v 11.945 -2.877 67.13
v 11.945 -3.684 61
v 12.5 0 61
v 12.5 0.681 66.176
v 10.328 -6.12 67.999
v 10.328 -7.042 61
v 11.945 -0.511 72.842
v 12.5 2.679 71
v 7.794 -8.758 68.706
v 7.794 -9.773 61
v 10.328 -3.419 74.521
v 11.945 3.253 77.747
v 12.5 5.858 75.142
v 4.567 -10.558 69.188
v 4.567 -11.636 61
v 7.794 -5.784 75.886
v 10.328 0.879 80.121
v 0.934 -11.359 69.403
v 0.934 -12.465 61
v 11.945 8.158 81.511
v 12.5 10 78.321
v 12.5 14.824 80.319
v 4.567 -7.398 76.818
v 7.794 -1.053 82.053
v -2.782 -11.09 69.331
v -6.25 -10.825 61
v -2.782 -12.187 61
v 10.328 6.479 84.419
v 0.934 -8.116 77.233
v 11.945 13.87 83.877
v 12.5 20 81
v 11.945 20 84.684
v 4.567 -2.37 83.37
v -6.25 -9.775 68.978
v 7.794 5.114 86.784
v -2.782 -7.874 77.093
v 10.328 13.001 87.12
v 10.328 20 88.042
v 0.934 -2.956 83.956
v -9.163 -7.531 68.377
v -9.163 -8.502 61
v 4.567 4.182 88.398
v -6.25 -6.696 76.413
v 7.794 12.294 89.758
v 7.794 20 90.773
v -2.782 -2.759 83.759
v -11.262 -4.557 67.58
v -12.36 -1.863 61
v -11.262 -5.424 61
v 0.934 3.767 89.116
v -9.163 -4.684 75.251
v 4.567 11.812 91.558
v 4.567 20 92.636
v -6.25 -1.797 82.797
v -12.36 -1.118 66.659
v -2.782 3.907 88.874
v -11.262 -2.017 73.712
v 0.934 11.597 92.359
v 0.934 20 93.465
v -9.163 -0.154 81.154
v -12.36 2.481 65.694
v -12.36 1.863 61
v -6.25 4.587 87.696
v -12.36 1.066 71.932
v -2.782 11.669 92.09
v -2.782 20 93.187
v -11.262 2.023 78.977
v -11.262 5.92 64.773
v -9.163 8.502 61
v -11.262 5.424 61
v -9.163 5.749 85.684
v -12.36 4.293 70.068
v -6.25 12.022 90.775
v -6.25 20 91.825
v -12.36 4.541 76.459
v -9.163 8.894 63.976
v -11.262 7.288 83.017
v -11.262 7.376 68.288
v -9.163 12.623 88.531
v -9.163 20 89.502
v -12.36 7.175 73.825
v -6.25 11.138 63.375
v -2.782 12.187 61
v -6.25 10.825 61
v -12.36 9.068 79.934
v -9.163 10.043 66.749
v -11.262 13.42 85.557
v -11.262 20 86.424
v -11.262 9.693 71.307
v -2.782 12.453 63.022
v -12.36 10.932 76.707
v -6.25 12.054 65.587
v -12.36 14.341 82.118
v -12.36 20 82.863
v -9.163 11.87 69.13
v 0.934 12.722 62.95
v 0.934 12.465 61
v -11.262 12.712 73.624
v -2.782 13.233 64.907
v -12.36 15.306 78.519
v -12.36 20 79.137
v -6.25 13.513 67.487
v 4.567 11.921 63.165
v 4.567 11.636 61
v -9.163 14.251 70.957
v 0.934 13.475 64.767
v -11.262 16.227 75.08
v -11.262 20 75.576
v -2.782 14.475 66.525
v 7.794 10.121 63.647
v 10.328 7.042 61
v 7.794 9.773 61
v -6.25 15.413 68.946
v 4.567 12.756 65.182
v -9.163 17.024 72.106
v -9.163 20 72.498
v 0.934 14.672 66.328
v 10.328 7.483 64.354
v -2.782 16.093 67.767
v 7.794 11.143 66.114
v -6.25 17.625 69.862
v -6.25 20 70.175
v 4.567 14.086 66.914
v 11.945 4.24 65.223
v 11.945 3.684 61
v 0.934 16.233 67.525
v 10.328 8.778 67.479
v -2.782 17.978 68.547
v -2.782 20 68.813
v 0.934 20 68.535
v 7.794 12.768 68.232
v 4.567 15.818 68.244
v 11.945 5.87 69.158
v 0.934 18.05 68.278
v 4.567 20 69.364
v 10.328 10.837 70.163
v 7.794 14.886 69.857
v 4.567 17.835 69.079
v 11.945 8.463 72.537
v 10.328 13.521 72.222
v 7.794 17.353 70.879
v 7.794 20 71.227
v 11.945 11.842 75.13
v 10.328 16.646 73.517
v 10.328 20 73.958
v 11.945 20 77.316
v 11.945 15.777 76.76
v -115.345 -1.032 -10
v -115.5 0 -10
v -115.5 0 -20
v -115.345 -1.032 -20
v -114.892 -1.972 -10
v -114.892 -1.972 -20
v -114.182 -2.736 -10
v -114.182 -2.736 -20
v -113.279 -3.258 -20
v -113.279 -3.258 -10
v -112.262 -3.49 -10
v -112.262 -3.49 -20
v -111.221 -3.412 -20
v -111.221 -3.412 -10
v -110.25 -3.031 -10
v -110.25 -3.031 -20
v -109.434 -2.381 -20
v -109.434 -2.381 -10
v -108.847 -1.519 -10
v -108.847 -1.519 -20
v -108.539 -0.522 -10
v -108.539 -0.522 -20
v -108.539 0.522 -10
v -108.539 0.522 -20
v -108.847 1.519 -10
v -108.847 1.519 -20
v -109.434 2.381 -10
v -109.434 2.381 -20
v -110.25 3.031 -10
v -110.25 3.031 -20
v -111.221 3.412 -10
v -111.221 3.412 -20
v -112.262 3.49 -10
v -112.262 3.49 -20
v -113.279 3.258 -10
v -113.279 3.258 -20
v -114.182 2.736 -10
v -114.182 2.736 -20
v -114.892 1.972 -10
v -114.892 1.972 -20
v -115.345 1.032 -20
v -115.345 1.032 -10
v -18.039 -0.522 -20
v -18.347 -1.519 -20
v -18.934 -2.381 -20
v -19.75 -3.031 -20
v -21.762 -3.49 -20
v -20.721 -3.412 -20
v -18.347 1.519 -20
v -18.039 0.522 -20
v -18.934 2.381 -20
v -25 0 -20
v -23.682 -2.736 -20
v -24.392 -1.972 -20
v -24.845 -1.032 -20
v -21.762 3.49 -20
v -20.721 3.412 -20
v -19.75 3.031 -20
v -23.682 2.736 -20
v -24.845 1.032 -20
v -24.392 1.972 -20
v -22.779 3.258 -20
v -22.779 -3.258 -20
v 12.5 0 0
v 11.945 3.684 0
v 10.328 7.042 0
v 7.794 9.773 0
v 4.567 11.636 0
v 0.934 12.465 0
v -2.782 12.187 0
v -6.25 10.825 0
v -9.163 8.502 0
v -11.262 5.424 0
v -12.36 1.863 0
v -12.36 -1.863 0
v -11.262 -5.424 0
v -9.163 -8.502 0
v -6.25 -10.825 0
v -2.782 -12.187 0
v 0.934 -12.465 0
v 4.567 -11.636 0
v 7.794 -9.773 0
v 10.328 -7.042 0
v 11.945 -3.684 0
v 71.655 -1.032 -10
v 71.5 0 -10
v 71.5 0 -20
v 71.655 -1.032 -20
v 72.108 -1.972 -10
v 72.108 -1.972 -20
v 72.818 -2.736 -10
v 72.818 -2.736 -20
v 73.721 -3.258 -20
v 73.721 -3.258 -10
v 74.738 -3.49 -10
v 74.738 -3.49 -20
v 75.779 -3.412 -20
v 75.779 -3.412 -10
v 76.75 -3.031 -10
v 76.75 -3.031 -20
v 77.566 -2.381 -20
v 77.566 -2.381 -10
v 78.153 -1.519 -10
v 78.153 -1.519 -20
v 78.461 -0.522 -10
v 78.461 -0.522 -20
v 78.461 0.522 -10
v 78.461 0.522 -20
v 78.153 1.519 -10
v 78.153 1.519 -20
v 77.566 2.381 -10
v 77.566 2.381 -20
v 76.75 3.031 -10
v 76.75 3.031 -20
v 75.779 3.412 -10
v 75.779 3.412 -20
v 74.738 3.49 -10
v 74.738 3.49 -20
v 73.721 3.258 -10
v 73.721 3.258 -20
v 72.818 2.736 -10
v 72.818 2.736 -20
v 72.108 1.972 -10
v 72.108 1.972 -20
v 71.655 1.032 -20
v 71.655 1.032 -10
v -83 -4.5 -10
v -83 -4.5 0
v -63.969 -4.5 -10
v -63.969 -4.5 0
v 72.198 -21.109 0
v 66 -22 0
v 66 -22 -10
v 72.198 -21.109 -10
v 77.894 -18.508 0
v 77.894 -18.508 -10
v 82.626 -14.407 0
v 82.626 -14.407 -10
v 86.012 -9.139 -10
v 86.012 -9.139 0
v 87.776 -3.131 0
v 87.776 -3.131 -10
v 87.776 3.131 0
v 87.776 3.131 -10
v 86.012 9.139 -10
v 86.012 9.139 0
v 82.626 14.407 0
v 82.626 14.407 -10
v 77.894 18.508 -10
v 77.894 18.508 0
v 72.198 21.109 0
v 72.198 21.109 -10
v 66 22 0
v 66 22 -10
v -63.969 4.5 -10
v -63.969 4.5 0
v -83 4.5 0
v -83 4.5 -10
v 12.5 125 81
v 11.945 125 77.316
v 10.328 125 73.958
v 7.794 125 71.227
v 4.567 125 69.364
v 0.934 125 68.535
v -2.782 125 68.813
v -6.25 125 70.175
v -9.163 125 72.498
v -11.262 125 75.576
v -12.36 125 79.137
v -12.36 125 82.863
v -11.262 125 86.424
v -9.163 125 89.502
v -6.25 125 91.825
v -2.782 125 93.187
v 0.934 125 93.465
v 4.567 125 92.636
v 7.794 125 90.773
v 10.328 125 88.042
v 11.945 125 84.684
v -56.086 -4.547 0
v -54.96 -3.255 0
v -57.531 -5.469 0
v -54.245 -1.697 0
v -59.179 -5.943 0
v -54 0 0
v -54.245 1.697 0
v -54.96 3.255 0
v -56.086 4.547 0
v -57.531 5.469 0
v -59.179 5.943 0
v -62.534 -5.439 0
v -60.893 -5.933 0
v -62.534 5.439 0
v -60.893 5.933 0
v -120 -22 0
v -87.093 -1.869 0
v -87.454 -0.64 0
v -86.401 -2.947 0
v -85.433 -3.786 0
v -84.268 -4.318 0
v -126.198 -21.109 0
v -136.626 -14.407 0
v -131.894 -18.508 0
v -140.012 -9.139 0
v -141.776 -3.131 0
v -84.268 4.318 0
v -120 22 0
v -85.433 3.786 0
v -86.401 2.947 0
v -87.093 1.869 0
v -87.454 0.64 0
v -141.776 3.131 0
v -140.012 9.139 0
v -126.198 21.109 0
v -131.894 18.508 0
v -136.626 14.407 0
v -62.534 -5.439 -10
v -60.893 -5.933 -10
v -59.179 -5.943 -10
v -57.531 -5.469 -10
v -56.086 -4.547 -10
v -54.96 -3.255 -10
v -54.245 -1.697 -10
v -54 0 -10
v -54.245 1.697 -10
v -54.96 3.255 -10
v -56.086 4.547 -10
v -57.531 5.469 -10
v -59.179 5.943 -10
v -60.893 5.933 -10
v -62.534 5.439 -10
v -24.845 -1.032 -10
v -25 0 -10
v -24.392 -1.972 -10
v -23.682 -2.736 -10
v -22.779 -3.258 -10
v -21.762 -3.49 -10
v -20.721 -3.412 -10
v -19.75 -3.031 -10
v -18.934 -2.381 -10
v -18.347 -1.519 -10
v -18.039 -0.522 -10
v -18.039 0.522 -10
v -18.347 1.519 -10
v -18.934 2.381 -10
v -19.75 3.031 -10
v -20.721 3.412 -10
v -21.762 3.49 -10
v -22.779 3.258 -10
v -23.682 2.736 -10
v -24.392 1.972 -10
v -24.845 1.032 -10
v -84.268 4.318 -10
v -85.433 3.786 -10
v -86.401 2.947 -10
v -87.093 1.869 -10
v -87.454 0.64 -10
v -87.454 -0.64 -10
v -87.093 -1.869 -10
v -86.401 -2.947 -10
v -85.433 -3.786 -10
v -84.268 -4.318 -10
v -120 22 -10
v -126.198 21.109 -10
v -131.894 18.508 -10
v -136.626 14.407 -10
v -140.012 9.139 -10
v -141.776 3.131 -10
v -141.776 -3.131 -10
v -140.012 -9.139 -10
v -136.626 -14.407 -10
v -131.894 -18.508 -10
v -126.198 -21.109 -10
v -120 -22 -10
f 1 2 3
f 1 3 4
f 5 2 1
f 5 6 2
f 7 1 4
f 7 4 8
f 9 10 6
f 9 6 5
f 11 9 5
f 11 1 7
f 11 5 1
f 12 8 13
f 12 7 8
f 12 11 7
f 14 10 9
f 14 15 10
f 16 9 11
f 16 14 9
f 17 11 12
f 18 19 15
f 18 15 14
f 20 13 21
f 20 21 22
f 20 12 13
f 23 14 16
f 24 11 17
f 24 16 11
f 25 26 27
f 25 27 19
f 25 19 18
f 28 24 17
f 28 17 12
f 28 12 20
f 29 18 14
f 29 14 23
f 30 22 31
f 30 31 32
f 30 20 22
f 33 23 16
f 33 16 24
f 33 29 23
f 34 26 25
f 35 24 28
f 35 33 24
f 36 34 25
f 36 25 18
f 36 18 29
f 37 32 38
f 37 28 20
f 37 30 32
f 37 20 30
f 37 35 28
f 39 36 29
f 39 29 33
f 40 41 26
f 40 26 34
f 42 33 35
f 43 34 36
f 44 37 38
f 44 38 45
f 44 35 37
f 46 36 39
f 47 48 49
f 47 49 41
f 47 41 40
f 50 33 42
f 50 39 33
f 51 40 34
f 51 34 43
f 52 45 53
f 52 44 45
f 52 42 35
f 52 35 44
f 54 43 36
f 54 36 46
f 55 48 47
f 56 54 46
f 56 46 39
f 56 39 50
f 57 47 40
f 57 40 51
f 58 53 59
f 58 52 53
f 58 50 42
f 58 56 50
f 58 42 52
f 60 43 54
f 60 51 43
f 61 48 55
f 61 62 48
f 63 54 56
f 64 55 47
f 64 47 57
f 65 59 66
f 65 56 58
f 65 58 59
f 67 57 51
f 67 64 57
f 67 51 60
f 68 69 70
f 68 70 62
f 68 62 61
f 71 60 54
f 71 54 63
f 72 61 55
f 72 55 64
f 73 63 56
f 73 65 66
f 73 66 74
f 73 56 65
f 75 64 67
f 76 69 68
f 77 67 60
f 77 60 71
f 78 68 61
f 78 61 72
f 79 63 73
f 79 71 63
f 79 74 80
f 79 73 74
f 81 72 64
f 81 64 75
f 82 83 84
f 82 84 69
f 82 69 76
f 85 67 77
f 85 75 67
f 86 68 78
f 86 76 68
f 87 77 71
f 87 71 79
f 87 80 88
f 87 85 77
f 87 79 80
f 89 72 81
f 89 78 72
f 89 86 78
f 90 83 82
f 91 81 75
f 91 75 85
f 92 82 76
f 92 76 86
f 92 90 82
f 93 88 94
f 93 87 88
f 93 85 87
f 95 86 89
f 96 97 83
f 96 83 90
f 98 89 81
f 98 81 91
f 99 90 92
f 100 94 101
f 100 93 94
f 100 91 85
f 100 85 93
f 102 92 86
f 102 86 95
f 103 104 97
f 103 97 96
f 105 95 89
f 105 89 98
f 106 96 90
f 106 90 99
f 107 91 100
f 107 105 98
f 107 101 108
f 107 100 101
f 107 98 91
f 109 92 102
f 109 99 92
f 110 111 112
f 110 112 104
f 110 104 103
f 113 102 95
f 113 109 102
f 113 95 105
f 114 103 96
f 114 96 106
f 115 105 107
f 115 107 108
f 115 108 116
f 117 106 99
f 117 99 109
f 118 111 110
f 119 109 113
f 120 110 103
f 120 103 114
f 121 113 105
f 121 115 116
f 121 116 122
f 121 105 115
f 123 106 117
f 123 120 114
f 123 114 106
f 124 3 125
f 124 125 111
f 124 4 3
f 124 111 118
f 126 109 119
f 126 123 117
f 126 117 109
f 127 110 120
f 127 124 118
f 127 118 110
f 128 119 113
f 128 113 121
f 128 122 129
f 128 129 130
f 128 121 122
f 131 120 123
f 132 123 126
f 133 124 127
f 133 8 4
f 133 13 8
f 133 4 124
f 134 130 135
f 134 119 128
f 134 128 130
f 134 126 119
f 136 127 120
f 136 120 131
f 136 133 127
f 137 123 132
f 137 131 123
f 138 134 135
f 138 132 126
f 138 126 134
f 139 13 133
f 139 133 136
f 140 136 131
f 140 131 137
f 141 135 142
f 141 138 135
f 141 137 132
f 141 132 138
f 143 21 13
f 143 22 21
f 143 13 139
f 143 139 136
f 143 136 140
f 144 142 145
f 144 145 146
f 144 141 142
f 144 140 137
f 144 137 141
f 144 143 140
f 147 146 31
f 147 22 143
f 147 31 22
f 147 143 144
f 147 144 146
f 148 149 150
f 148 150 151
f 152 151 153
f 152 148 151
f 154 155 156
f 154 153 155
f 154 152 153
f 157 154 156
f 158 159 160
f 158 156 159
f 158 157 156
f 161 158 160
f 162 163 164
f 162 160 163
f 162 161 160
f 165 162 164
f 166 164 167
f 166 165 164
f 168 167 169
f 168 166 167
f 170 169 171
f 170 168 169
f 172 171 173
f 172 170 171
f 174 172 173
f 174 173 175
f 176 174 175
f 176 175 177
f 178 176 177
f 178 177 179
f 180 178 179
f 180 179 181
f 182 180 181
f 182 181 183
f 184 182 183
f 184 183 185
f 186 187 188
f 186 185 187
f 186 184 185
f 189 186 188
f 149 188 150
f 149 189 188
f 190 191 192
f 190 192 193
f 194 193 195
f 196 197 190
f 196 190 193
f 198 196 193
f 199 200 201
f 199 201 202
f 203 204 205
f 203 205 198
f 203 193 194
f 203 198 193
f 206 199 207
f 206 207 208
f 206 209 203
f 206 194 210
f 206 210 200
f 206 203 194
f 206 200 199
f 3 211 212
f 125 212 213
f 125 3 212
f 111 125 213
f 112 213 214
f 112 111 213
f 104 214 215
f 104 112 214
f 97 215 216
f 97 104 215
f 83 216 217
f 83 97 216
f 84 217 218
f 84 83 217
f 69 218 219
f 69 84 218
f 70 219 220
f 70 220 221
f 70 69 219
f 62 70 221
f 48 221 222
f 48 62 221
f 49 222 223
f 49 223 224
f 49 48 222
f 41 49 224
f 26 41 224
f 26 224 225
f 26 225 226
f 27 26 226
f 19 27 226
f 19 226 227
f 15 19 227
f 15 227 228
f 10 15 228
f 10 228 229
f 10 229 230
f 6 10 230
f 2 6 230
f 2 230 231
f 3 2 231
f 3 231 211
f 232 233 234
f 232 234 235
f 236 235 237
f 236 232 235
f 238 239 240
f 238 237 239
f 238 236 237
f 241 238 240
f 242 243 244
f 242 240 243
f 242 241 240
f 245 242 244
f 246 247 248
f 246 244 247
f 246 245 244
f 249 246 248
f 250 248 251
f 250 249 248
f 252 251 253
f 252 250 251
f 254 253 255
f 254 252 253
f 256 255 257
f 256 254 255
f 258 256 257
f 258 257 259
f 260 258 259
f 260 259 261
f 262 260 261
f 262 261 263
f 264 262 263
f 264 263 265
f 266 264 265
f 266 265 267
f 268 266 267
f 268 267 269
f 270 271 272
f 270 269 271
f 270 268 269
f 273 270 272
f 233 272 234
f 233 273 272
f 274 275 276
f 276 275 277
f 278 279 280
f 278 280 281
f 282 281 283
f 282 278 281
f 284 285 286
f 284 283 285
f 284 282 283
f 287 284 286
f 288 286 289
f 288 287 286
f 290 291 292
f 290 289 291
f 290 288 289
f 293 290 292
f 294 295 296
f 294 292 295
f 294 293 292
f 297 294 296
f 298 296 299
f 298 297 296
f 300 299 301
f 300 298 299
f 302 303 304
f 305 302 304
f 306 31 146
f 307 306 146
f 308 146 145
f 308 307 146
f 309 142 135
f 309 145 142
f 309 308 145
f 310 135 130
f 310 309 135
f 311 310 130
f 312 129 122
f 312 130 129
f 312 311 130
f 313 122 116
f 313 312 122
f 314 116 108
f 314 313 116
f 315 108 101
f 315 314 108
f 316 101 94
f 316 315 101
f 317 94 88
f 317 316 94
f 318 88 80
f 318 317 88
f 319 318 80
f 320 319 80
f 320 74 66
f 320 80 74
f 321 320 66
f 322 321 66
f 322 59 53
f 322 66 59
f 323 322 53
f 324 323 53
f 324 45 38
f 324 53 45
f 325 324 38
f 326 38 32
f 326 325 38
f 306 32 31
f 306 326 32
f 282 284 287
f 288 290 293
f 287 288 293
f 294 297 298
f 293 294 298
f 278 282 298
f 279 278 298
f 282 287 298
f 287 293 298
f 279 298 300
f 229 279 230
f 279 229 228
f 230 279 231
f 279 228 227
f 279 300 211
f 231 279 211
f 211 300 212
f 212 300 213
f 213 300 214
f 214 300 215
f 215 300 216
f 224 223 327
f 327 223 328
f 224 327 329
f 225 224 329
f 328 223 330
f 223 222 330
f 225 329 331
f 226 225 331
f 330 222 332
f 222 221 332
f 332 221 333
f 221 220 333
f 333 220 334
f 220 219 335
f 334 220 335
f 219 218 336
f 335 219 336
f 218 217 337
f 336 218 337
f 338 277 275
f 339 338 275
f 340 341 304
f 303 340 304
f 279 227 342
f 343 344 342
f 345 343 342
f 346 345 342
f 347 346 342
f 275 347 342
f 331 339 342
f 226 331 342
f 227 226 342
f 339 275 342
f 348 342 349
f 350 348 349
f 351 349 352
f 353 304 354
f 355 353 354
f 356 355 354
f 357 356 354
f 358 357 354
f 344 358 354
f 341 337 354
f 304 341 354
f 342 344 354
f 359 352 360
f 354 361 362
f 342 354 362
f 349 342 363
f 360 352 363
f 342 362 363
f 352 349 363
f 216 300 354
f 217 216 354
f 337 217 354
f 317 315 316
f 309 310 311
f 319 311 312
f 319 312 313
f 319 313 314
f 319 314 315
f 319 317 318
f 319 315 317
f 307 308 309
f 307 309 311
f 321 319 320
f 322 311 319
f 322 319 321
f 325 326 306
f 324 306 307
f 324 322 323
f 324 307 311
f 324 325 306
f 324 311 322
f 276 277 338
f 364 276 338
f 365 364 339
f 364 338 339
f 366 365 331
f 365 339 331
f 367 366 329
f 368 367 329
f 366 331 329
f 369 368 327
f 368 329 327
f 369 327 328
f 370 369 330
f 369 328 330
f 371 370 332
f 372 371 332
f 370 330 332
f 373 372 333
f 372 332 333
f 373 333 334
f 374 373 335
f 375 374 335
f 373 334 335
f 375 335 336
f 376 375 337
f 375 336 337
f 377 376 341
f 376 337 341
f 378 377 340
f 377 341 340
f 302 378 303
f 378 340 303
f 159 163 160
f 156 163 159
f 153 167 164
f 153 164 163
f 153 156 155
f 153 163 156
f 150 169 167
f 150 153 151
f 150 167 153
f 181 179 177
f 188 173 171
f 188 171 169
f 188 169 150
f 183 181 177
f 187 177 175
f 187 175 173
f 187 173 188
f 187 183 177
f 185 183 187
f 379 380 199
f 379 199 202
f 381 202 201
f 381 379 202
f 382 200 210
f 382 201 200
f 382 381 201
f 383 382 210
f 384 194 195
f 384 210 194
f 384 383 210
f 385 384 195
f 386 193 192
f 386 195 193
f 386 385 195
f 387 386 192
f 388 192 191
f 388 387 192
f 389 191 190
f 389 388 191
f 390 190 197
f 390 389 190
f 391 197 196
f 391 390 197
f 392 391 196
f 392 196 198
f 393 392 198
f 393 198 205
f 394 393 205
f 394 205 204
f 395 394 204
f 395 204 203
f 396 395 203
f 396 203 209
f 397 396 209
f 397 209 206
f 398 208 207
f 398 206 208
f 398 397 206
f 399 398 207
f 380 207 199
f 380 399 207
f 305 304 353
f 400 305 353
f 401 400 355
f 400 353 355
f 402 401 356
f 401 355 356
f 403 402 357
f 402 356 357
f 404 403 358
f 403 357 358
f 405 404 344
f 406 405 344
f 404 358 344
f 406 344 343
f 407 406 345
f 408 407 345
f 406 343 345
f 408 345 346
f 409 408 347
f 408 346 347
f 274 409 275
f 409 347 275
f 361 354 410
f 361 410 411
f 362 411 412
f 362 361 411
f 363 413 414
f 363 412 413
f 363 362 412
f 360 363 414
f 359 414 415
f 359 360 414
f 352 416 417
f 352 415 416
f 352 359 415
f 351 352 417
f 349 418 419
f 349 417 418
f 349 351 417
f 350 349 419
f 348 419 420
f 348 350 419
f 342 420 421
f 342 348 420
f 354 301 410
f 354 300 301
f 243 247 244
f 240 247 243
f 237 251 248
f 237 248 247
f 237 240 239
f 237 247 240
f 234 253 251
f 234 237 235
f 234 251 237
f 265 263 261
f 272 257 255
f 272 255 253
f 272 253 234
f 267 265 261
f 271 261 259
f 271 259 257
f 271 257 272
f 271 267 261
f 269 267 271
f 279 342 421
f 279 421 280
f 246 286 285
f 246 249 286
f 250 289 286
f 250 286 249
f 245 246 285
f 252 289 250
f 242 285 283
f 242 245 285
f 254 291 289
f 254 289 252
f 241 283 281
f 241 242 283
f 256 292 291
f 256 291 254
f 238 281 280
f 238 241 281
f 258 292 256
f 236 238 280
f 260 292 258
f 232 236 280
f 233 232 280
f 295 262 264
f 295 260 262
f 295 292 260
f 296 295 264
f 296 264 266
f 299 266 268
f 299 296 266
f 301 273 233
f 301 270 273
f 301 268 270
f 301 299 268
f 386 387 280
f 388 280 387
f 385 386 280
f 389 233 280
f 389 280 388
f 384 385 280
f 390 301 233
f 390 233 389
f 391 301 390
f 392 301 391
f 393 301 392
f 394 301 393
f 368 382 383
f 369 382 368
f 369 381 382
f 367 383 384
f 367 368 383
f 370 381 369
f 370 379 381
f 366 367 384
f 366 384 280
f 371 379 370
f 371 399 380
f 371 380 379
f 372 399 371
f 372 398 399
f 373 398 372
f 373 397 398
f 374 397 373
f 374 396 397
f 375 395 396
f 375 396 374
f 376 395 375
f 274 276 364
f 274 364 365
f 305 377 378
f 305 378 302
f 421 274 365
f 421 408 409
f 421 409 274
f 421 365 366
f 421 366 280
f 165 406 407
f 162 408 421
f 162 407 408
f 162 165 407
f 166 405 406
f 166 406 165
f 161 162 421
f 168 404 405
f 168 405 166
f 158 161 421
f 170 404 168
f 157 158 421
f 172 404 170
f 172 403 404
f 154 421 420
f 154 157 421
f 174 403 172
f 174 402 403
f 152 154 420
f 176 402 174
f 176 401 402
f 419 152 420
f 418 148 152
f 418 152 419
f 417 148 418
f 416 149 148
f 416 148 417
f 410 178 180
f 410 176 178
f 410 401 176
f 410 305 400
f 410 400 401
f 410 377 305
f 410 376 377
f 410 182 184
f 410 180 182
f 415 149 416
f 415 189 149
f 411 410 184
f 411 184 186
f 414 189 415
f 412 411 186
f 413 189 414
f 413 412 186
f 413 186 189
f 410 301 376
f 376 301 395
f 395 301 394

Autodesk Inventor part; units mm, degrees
ref_plane "YZ Plane" through (0, 0, 0) normal (1, 0, 0) x (0, 1, 0)
ref_plane "XZ Plane" through (0, 0, 0) normal (0, 1, 0) x (-1, 0, 0)
sketch "Sketch1" plane through (0, 0, 0) normal (0, 0, 1) x (1, 0, 0)
  circle A0 centre (0, 0) radius 12.5
  dimension "d0" = 25
sketch "Sketch2" plane through (0, 0, 0) normal (1, 0, 0) x (0, 1, 0)
  line L0 (0, 0) -> (0, 61)
  arc A0 (20, 81) -> (0, 61) centre (20, 61) ccw
  line L1 (20, 81) -> (125, 81)
  dimension "d1" = 61
  dimension "d30" = 105
  dimension "d31" = 20
ref_plane "Work Plane1" through (0, 0, 61) normal (0, 0, 1) x (1, 0, 0)
sweep "Sweep2" add profiles "Sketch1" path "Sketch2"
sketch "Sketch4" plane through (0, 0, 0) normal (0, 0, -1) x (-1, 0, 0)
  line L0 (-66, 0) -> (120, 0) construction
  line L1 (-66, 22) -> (120, 22)
  line L2 (120, -22) -> (-66, -22)
  arc A0 (-66, 22) -> (-66, -22) centre (-66, 0) ccw
  arc A1 (120, -22) -> (120, 22) centre (120, 0) ccw
  circle A2 centre (0, 0) radius 12.5 projected
  point P0 (27, 0)
  point P1 (27, 0)
  point P2 (142, 0)
  point P3 (-88, 0)
  dimension "d10" = 44
  dimension "d12" = 88
  dimension "d13" = 230
extrude "Extrusion1" add sketch "Sketch4" along normal blind 10 contours L1 A1 L2 A0 | A2
sketch "Sketch5" plane through (0, 0, -10) normal (0, 0, -1) x (-1, 0, 0)
  circle A0 centre (-75, 0) radius 3.5
  circle A1 centre (21.5, 0) radius 3.5
  circle A2 centre (112, 0) radius 3.5
  circle A3 centre (0, 0) radius 12.5 projected
  dimension "d16" = 7
  dimension "d17" = 21.5
  dimension "d18" = 75
  dimension "d19" = 90.5
extrude "Extrusion2" add sketch "Sketch5" along normal blind 10 contours A0 | A1 | A2
sketch "Sketch6" plane through (0, 0, 0) normal (0, 0, 1) x (1, 0, 0)
  arc A0 (-63.9686, -4.5) -> (-63.9686, 4.5) centre (-60, 0) ccw
  circle A1 centre (0, 0) radius 12.5 projected
  line L0 (-63.9686, 4.5) -> (-83, 4.5)
  arc A2 (-83, 4.5) -> (-83, -4.5) centre (-83, 0) ccw
  line L1 (-83, -4.5) -> (-63.9686, -4.5)
  arc A3 (-120, 22) -> (-120, -22) centre (-120, 0) ccw projected
  point P0 (-142, 0)
  dimension "d22" = 12
  dimension "d23" = 60
  dimension "d24" = 4.5
  dimension "d25" = 23
extrude "Extrusion3" cut sketch "Sketch6" against normal blind 10 contours L1 A2 L0 A0
properties part number "garnitur_lang"
